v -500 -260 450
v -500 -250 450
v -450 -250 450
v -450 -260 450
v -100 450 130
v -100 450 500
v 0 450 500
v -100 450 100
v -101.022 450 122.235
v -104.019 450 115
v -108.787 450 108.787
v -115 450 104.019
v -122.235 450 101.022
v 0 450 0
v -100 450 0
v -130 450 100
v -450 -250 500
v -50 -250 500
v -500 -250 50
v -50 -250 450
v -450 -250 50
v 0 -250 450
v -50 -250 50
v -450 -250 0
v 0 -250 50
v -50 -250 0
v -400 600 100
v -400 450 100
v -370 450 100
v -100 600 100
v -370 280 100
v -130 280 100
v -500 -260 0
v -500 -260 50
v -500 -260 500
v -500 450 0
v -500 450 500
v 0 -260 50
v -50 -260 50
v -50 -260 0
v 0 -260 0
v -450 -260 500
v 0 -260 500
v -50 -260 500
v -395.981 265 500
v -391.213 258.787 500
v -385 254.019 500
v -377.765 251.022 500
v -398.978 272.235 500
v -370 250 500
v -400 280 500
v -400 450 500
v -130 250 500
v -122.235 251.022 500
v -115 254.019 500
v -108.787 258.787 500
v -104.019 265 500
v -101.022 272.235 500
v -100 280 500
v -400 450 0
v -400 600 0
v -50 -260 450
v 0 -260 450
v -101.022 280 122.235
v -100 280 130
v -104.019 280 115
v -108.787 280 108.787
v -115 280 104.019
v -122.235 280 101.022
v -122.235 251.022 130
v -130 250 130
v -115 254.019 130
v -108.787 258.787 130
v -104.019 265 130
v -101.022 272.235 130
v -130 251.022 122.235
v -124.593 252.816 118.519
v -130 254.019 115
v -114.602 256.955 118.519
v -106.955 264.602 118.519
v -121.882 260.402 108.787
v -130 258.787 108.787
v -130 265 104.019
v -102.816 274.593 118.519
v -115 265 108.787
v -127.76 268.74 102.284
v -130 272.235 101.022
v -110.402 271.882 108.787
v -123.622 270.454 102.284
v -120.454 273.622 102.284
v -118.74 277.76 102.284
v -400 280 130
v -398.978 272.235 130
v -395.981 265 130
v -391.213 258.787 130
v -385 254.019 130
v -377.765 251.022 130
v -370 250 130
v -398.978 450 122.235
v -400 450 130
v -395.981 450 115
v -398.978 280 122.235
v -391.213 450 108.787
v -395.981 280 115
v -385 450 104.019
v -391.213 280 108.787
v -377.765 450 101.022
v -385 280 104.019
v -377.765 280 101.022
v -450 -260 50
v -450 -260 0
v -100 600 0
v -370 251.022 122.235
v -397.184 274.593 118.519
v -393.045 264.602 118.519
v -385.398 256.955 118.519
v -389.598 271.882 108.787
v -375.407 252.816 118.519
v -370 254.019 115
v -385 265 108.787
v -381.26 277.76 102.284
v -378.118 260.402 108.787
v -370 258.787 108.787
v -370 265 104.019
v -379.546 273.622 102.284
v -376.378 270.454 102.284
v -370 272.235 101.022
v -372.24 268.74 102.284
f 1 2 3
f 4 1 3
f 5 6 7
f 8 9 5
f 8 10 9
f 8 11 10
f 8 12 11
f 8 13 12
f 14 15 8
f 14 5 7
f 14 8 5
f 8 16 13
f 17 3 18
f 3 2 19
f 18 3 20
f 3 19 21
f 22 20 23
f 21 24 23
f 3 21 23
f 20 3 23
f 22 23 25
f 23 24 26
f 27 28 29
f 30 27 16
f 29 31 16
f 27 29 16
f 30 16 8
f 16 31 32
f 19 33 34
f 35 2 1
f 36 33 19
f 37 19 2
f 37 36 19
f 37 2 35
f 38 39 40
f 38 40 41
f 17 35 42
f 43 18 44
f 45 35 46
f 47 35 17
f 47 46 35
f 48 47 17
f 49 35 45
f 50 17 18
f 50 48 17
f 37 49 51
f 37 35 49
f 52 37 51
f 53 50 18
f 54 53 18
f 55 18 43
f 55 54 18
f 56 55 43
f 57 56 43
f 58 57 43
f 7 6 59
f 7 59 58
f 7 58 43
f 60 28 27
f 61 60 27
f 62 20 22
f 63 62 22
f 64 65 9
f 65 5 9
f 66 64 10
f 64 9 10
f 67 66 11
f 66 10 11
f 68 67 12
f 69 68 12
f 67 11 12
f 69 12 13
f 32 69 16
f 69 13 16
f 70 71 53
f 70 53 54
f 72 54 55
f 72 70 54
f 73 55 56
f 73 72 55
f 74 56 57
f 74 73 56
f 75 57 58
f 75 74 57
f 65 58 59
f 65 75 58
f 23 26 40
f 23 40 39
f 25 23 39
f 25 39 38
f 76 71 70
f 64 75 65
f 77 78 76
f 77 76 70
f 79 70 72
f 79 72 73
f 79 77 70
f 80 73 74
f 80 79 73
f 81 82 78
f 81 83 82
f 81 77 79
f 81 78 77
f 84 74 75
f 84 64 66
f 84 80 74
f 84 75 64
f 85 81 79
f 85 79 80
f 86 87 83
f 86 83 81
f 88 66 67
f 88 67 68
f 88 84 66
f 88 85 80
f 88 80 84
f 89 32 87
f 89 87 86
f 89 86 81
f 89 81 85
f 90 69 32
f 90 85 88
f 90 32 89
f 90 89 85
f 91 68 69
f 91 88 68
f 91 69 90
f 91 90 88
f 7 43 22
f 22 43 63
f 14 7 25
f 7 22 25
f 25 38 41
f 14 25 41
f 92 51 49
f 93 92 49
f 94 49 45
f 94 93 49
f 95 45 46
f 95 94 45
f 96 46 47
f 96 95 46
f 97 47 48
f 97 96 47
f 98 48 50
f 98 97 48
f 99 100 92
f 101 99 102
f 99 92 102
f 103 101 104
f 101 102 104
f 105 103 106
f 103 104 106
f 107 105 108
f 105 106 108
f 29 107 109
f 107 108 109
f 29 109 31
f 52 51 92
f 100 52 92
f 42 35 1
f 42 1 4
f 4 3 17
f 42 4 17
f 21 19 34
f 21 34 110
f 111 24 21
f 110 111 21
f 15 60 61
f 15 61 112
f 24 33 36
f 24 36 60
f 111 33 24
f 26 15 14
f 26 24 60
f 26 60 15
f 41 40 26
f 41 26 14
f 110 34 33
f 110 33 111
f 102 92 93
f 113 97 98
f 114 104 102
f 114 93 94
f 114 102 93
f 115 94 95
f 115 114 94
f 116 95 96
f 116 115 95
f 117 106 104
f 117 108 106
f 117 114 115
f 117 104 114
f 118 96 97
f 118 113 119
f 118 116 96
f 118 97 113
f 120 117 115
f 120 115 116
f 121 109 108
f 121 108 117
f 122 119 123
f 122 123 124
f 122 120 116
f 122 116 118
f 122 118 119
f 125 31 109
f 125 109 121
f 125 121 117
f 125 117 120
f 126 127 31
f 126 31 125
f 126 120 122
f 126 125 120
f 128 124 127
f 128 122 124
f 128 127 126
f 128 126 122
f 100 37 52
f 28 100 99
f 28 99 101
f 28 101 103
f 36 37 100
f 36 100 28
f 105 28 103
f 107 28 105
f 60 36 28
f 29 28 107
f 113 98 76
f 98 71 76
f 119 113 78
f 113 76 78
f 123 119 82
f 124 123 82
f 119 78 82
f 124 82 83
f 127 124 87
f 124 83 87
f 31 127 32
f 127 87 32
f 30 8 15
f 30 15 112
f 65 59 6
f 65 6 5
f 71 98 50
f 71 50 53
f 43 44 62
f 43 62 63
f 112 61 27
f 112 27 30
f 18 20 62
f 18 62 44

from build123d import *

# Parameters (mm, degrees)
SKETCH1_W           = 500
SKETCH1_H           = 500
BOSS_EXTRUDE1_DEPTH = 250
SKETCH2_W           = 500
SKETCH2_H           = 100
BOSS_EXTRUDE2_DEPTH = 350
SKETCH3_W           = 100
SKETCH3_H           = 400
BOSS_EXTRUDE3_DEPTH = 200
SKETCH4_W           = 100
SKETCH4_H           = 400
BOSS_EXTRUDE4_DEPTH = 200
SKETCH5_W           = 100
SKETCH5_H           = 150
CUT_EXTRUDE4_DEPTH  = 200
SKETCH8_W           = 100
SKETCH8_H           = 150
CUT_EXTRUDE5_DEPTH  = 200
FILLET4_R           = 30
FILLET5_R           = 30
FILLET6_R           = 30
SKETCH9_W           = 50
SKETCH9_H           = 50
BOSS_EXTRUDE5_DEPTH = 10


with BuildPart() as part:
    # Sketch1 → Boss-Extrude1 (new body, symmetric)
    with BuildSketch(Plane(origin=(0, 0, 0), x_dir=(1, 0, 0), z_dir=(0, 1, 0))):
        with Locations((-250, -250)):
            Rectangle(SKETCH1_W, SKETCH1_H)
    extrude(amount=BOSS_EXTRUDE1_DEPTH, both=True)

    # Sketch2 → Boss-Extrude2 (add)
    with BuildSketch(Plane(origin=(0, 250, 0), x_dir=(1, 0, 0), z_dir=(0, 1, 0))):
        with Locations((-250, -50)):
            Rectangle(SKETCH2_W, SKETCH2_H)
    extrude(amount=BOSS_EXTRUDE2_DEPTH)

    # Sketch3 → Boss-Extrude3 (add)
    with BuildSketch(Plane(origin=(0, 250, 0), x_dir=(1, 0, 0), z_dir=(0, 1, 0))):
        with Locations((-450, -300)):
            Rectangle(SKETCH3_W, SKETCH3_H)
    extrude(amount=BOSS_EXTRUDE3_DEPTH)

    # Sketch4 → Boss-Extrude4 (add)
    with BuildSketch(Plane(origin=(0, 250, 0), x_dir=(1, 0, 0), z_dir=(0, 1, 0))):
        with Locations((-50, -300)):
            Rectangle(SKETCH4_W, SKETCH4_H)
    extrude(amount=BOSS_EXTRUDE4_DEPTH)

    # Sketch5 → Cut-Extrude4 (cut)
    with BuildSketch(Plane.XY.offset(100)):
        with Locations((-450, 525)):
            Rectangle(SKETCH5_W, SKETCH5_H)
    extrude(amount=-CUT_EXTRUDE4_DEPTH, mode=Mode.SUBTRACT)

    # Sketch8 → Cut-Extrude5 (cut)
    with BuildSketch(Plane.XY.offset(100)):
        with Locations((-50, 525)):
            Rectangle(SKETCH8_W, SKETCH8_H)
    extrude(amount=-CUT_EXTRUDE5_DEPTH, mode=Mode.SUBTRACT)

    # Fillet4
    fillet4_edges = [part.edges().sort_by_distance(p)[0] for p in [
        (-400, 250, 300),
    ]]
    fillet(fillet4_edges, radius=FILLET4_R)

    # Fillet5
    fillet5_edges = [part.edges().sort_by_distance(p)[0] for p in [
        (-100, 250, 300),
    ]]
    fillet(fillet5_edges, radius=FILLET5_R)

    # Fillet6
    fillet6_edges = [part.edges().sort_by_distance(p)[0] for p in [
        (-108.786796564, 258.786796564, 100),
        (-400, 365, 100),
        (-100, 365, 100),
        (-250, 250, 100),
        (-391.213203436, 258.786796564, 100),
    ]]
    fillet(fillet6_edges, radius=FILLET6_R)

    # Sketch9 → Boss-Extrude5 (add)
    with BuildSketch(Plane.XZ.offset(250)):
        with Locations((-475, 475)):
            Rectangle(SKETCH9_W, SKETCH9_H)
        with Locations((-475, 25)):
            Rectangle(SKETCH9_W, SKETCH9_H)
        with Locations((-25, 25)):
            Rectangle(SKETCH9_W, SKETCH9_H)
        with Locations((-25, 475)):
            Rectangle(SKETCH9_W, SKETCH9_H)
    extrude(amount=BOSS_EXTRUDE5_DEPTH)


solid = part.part
